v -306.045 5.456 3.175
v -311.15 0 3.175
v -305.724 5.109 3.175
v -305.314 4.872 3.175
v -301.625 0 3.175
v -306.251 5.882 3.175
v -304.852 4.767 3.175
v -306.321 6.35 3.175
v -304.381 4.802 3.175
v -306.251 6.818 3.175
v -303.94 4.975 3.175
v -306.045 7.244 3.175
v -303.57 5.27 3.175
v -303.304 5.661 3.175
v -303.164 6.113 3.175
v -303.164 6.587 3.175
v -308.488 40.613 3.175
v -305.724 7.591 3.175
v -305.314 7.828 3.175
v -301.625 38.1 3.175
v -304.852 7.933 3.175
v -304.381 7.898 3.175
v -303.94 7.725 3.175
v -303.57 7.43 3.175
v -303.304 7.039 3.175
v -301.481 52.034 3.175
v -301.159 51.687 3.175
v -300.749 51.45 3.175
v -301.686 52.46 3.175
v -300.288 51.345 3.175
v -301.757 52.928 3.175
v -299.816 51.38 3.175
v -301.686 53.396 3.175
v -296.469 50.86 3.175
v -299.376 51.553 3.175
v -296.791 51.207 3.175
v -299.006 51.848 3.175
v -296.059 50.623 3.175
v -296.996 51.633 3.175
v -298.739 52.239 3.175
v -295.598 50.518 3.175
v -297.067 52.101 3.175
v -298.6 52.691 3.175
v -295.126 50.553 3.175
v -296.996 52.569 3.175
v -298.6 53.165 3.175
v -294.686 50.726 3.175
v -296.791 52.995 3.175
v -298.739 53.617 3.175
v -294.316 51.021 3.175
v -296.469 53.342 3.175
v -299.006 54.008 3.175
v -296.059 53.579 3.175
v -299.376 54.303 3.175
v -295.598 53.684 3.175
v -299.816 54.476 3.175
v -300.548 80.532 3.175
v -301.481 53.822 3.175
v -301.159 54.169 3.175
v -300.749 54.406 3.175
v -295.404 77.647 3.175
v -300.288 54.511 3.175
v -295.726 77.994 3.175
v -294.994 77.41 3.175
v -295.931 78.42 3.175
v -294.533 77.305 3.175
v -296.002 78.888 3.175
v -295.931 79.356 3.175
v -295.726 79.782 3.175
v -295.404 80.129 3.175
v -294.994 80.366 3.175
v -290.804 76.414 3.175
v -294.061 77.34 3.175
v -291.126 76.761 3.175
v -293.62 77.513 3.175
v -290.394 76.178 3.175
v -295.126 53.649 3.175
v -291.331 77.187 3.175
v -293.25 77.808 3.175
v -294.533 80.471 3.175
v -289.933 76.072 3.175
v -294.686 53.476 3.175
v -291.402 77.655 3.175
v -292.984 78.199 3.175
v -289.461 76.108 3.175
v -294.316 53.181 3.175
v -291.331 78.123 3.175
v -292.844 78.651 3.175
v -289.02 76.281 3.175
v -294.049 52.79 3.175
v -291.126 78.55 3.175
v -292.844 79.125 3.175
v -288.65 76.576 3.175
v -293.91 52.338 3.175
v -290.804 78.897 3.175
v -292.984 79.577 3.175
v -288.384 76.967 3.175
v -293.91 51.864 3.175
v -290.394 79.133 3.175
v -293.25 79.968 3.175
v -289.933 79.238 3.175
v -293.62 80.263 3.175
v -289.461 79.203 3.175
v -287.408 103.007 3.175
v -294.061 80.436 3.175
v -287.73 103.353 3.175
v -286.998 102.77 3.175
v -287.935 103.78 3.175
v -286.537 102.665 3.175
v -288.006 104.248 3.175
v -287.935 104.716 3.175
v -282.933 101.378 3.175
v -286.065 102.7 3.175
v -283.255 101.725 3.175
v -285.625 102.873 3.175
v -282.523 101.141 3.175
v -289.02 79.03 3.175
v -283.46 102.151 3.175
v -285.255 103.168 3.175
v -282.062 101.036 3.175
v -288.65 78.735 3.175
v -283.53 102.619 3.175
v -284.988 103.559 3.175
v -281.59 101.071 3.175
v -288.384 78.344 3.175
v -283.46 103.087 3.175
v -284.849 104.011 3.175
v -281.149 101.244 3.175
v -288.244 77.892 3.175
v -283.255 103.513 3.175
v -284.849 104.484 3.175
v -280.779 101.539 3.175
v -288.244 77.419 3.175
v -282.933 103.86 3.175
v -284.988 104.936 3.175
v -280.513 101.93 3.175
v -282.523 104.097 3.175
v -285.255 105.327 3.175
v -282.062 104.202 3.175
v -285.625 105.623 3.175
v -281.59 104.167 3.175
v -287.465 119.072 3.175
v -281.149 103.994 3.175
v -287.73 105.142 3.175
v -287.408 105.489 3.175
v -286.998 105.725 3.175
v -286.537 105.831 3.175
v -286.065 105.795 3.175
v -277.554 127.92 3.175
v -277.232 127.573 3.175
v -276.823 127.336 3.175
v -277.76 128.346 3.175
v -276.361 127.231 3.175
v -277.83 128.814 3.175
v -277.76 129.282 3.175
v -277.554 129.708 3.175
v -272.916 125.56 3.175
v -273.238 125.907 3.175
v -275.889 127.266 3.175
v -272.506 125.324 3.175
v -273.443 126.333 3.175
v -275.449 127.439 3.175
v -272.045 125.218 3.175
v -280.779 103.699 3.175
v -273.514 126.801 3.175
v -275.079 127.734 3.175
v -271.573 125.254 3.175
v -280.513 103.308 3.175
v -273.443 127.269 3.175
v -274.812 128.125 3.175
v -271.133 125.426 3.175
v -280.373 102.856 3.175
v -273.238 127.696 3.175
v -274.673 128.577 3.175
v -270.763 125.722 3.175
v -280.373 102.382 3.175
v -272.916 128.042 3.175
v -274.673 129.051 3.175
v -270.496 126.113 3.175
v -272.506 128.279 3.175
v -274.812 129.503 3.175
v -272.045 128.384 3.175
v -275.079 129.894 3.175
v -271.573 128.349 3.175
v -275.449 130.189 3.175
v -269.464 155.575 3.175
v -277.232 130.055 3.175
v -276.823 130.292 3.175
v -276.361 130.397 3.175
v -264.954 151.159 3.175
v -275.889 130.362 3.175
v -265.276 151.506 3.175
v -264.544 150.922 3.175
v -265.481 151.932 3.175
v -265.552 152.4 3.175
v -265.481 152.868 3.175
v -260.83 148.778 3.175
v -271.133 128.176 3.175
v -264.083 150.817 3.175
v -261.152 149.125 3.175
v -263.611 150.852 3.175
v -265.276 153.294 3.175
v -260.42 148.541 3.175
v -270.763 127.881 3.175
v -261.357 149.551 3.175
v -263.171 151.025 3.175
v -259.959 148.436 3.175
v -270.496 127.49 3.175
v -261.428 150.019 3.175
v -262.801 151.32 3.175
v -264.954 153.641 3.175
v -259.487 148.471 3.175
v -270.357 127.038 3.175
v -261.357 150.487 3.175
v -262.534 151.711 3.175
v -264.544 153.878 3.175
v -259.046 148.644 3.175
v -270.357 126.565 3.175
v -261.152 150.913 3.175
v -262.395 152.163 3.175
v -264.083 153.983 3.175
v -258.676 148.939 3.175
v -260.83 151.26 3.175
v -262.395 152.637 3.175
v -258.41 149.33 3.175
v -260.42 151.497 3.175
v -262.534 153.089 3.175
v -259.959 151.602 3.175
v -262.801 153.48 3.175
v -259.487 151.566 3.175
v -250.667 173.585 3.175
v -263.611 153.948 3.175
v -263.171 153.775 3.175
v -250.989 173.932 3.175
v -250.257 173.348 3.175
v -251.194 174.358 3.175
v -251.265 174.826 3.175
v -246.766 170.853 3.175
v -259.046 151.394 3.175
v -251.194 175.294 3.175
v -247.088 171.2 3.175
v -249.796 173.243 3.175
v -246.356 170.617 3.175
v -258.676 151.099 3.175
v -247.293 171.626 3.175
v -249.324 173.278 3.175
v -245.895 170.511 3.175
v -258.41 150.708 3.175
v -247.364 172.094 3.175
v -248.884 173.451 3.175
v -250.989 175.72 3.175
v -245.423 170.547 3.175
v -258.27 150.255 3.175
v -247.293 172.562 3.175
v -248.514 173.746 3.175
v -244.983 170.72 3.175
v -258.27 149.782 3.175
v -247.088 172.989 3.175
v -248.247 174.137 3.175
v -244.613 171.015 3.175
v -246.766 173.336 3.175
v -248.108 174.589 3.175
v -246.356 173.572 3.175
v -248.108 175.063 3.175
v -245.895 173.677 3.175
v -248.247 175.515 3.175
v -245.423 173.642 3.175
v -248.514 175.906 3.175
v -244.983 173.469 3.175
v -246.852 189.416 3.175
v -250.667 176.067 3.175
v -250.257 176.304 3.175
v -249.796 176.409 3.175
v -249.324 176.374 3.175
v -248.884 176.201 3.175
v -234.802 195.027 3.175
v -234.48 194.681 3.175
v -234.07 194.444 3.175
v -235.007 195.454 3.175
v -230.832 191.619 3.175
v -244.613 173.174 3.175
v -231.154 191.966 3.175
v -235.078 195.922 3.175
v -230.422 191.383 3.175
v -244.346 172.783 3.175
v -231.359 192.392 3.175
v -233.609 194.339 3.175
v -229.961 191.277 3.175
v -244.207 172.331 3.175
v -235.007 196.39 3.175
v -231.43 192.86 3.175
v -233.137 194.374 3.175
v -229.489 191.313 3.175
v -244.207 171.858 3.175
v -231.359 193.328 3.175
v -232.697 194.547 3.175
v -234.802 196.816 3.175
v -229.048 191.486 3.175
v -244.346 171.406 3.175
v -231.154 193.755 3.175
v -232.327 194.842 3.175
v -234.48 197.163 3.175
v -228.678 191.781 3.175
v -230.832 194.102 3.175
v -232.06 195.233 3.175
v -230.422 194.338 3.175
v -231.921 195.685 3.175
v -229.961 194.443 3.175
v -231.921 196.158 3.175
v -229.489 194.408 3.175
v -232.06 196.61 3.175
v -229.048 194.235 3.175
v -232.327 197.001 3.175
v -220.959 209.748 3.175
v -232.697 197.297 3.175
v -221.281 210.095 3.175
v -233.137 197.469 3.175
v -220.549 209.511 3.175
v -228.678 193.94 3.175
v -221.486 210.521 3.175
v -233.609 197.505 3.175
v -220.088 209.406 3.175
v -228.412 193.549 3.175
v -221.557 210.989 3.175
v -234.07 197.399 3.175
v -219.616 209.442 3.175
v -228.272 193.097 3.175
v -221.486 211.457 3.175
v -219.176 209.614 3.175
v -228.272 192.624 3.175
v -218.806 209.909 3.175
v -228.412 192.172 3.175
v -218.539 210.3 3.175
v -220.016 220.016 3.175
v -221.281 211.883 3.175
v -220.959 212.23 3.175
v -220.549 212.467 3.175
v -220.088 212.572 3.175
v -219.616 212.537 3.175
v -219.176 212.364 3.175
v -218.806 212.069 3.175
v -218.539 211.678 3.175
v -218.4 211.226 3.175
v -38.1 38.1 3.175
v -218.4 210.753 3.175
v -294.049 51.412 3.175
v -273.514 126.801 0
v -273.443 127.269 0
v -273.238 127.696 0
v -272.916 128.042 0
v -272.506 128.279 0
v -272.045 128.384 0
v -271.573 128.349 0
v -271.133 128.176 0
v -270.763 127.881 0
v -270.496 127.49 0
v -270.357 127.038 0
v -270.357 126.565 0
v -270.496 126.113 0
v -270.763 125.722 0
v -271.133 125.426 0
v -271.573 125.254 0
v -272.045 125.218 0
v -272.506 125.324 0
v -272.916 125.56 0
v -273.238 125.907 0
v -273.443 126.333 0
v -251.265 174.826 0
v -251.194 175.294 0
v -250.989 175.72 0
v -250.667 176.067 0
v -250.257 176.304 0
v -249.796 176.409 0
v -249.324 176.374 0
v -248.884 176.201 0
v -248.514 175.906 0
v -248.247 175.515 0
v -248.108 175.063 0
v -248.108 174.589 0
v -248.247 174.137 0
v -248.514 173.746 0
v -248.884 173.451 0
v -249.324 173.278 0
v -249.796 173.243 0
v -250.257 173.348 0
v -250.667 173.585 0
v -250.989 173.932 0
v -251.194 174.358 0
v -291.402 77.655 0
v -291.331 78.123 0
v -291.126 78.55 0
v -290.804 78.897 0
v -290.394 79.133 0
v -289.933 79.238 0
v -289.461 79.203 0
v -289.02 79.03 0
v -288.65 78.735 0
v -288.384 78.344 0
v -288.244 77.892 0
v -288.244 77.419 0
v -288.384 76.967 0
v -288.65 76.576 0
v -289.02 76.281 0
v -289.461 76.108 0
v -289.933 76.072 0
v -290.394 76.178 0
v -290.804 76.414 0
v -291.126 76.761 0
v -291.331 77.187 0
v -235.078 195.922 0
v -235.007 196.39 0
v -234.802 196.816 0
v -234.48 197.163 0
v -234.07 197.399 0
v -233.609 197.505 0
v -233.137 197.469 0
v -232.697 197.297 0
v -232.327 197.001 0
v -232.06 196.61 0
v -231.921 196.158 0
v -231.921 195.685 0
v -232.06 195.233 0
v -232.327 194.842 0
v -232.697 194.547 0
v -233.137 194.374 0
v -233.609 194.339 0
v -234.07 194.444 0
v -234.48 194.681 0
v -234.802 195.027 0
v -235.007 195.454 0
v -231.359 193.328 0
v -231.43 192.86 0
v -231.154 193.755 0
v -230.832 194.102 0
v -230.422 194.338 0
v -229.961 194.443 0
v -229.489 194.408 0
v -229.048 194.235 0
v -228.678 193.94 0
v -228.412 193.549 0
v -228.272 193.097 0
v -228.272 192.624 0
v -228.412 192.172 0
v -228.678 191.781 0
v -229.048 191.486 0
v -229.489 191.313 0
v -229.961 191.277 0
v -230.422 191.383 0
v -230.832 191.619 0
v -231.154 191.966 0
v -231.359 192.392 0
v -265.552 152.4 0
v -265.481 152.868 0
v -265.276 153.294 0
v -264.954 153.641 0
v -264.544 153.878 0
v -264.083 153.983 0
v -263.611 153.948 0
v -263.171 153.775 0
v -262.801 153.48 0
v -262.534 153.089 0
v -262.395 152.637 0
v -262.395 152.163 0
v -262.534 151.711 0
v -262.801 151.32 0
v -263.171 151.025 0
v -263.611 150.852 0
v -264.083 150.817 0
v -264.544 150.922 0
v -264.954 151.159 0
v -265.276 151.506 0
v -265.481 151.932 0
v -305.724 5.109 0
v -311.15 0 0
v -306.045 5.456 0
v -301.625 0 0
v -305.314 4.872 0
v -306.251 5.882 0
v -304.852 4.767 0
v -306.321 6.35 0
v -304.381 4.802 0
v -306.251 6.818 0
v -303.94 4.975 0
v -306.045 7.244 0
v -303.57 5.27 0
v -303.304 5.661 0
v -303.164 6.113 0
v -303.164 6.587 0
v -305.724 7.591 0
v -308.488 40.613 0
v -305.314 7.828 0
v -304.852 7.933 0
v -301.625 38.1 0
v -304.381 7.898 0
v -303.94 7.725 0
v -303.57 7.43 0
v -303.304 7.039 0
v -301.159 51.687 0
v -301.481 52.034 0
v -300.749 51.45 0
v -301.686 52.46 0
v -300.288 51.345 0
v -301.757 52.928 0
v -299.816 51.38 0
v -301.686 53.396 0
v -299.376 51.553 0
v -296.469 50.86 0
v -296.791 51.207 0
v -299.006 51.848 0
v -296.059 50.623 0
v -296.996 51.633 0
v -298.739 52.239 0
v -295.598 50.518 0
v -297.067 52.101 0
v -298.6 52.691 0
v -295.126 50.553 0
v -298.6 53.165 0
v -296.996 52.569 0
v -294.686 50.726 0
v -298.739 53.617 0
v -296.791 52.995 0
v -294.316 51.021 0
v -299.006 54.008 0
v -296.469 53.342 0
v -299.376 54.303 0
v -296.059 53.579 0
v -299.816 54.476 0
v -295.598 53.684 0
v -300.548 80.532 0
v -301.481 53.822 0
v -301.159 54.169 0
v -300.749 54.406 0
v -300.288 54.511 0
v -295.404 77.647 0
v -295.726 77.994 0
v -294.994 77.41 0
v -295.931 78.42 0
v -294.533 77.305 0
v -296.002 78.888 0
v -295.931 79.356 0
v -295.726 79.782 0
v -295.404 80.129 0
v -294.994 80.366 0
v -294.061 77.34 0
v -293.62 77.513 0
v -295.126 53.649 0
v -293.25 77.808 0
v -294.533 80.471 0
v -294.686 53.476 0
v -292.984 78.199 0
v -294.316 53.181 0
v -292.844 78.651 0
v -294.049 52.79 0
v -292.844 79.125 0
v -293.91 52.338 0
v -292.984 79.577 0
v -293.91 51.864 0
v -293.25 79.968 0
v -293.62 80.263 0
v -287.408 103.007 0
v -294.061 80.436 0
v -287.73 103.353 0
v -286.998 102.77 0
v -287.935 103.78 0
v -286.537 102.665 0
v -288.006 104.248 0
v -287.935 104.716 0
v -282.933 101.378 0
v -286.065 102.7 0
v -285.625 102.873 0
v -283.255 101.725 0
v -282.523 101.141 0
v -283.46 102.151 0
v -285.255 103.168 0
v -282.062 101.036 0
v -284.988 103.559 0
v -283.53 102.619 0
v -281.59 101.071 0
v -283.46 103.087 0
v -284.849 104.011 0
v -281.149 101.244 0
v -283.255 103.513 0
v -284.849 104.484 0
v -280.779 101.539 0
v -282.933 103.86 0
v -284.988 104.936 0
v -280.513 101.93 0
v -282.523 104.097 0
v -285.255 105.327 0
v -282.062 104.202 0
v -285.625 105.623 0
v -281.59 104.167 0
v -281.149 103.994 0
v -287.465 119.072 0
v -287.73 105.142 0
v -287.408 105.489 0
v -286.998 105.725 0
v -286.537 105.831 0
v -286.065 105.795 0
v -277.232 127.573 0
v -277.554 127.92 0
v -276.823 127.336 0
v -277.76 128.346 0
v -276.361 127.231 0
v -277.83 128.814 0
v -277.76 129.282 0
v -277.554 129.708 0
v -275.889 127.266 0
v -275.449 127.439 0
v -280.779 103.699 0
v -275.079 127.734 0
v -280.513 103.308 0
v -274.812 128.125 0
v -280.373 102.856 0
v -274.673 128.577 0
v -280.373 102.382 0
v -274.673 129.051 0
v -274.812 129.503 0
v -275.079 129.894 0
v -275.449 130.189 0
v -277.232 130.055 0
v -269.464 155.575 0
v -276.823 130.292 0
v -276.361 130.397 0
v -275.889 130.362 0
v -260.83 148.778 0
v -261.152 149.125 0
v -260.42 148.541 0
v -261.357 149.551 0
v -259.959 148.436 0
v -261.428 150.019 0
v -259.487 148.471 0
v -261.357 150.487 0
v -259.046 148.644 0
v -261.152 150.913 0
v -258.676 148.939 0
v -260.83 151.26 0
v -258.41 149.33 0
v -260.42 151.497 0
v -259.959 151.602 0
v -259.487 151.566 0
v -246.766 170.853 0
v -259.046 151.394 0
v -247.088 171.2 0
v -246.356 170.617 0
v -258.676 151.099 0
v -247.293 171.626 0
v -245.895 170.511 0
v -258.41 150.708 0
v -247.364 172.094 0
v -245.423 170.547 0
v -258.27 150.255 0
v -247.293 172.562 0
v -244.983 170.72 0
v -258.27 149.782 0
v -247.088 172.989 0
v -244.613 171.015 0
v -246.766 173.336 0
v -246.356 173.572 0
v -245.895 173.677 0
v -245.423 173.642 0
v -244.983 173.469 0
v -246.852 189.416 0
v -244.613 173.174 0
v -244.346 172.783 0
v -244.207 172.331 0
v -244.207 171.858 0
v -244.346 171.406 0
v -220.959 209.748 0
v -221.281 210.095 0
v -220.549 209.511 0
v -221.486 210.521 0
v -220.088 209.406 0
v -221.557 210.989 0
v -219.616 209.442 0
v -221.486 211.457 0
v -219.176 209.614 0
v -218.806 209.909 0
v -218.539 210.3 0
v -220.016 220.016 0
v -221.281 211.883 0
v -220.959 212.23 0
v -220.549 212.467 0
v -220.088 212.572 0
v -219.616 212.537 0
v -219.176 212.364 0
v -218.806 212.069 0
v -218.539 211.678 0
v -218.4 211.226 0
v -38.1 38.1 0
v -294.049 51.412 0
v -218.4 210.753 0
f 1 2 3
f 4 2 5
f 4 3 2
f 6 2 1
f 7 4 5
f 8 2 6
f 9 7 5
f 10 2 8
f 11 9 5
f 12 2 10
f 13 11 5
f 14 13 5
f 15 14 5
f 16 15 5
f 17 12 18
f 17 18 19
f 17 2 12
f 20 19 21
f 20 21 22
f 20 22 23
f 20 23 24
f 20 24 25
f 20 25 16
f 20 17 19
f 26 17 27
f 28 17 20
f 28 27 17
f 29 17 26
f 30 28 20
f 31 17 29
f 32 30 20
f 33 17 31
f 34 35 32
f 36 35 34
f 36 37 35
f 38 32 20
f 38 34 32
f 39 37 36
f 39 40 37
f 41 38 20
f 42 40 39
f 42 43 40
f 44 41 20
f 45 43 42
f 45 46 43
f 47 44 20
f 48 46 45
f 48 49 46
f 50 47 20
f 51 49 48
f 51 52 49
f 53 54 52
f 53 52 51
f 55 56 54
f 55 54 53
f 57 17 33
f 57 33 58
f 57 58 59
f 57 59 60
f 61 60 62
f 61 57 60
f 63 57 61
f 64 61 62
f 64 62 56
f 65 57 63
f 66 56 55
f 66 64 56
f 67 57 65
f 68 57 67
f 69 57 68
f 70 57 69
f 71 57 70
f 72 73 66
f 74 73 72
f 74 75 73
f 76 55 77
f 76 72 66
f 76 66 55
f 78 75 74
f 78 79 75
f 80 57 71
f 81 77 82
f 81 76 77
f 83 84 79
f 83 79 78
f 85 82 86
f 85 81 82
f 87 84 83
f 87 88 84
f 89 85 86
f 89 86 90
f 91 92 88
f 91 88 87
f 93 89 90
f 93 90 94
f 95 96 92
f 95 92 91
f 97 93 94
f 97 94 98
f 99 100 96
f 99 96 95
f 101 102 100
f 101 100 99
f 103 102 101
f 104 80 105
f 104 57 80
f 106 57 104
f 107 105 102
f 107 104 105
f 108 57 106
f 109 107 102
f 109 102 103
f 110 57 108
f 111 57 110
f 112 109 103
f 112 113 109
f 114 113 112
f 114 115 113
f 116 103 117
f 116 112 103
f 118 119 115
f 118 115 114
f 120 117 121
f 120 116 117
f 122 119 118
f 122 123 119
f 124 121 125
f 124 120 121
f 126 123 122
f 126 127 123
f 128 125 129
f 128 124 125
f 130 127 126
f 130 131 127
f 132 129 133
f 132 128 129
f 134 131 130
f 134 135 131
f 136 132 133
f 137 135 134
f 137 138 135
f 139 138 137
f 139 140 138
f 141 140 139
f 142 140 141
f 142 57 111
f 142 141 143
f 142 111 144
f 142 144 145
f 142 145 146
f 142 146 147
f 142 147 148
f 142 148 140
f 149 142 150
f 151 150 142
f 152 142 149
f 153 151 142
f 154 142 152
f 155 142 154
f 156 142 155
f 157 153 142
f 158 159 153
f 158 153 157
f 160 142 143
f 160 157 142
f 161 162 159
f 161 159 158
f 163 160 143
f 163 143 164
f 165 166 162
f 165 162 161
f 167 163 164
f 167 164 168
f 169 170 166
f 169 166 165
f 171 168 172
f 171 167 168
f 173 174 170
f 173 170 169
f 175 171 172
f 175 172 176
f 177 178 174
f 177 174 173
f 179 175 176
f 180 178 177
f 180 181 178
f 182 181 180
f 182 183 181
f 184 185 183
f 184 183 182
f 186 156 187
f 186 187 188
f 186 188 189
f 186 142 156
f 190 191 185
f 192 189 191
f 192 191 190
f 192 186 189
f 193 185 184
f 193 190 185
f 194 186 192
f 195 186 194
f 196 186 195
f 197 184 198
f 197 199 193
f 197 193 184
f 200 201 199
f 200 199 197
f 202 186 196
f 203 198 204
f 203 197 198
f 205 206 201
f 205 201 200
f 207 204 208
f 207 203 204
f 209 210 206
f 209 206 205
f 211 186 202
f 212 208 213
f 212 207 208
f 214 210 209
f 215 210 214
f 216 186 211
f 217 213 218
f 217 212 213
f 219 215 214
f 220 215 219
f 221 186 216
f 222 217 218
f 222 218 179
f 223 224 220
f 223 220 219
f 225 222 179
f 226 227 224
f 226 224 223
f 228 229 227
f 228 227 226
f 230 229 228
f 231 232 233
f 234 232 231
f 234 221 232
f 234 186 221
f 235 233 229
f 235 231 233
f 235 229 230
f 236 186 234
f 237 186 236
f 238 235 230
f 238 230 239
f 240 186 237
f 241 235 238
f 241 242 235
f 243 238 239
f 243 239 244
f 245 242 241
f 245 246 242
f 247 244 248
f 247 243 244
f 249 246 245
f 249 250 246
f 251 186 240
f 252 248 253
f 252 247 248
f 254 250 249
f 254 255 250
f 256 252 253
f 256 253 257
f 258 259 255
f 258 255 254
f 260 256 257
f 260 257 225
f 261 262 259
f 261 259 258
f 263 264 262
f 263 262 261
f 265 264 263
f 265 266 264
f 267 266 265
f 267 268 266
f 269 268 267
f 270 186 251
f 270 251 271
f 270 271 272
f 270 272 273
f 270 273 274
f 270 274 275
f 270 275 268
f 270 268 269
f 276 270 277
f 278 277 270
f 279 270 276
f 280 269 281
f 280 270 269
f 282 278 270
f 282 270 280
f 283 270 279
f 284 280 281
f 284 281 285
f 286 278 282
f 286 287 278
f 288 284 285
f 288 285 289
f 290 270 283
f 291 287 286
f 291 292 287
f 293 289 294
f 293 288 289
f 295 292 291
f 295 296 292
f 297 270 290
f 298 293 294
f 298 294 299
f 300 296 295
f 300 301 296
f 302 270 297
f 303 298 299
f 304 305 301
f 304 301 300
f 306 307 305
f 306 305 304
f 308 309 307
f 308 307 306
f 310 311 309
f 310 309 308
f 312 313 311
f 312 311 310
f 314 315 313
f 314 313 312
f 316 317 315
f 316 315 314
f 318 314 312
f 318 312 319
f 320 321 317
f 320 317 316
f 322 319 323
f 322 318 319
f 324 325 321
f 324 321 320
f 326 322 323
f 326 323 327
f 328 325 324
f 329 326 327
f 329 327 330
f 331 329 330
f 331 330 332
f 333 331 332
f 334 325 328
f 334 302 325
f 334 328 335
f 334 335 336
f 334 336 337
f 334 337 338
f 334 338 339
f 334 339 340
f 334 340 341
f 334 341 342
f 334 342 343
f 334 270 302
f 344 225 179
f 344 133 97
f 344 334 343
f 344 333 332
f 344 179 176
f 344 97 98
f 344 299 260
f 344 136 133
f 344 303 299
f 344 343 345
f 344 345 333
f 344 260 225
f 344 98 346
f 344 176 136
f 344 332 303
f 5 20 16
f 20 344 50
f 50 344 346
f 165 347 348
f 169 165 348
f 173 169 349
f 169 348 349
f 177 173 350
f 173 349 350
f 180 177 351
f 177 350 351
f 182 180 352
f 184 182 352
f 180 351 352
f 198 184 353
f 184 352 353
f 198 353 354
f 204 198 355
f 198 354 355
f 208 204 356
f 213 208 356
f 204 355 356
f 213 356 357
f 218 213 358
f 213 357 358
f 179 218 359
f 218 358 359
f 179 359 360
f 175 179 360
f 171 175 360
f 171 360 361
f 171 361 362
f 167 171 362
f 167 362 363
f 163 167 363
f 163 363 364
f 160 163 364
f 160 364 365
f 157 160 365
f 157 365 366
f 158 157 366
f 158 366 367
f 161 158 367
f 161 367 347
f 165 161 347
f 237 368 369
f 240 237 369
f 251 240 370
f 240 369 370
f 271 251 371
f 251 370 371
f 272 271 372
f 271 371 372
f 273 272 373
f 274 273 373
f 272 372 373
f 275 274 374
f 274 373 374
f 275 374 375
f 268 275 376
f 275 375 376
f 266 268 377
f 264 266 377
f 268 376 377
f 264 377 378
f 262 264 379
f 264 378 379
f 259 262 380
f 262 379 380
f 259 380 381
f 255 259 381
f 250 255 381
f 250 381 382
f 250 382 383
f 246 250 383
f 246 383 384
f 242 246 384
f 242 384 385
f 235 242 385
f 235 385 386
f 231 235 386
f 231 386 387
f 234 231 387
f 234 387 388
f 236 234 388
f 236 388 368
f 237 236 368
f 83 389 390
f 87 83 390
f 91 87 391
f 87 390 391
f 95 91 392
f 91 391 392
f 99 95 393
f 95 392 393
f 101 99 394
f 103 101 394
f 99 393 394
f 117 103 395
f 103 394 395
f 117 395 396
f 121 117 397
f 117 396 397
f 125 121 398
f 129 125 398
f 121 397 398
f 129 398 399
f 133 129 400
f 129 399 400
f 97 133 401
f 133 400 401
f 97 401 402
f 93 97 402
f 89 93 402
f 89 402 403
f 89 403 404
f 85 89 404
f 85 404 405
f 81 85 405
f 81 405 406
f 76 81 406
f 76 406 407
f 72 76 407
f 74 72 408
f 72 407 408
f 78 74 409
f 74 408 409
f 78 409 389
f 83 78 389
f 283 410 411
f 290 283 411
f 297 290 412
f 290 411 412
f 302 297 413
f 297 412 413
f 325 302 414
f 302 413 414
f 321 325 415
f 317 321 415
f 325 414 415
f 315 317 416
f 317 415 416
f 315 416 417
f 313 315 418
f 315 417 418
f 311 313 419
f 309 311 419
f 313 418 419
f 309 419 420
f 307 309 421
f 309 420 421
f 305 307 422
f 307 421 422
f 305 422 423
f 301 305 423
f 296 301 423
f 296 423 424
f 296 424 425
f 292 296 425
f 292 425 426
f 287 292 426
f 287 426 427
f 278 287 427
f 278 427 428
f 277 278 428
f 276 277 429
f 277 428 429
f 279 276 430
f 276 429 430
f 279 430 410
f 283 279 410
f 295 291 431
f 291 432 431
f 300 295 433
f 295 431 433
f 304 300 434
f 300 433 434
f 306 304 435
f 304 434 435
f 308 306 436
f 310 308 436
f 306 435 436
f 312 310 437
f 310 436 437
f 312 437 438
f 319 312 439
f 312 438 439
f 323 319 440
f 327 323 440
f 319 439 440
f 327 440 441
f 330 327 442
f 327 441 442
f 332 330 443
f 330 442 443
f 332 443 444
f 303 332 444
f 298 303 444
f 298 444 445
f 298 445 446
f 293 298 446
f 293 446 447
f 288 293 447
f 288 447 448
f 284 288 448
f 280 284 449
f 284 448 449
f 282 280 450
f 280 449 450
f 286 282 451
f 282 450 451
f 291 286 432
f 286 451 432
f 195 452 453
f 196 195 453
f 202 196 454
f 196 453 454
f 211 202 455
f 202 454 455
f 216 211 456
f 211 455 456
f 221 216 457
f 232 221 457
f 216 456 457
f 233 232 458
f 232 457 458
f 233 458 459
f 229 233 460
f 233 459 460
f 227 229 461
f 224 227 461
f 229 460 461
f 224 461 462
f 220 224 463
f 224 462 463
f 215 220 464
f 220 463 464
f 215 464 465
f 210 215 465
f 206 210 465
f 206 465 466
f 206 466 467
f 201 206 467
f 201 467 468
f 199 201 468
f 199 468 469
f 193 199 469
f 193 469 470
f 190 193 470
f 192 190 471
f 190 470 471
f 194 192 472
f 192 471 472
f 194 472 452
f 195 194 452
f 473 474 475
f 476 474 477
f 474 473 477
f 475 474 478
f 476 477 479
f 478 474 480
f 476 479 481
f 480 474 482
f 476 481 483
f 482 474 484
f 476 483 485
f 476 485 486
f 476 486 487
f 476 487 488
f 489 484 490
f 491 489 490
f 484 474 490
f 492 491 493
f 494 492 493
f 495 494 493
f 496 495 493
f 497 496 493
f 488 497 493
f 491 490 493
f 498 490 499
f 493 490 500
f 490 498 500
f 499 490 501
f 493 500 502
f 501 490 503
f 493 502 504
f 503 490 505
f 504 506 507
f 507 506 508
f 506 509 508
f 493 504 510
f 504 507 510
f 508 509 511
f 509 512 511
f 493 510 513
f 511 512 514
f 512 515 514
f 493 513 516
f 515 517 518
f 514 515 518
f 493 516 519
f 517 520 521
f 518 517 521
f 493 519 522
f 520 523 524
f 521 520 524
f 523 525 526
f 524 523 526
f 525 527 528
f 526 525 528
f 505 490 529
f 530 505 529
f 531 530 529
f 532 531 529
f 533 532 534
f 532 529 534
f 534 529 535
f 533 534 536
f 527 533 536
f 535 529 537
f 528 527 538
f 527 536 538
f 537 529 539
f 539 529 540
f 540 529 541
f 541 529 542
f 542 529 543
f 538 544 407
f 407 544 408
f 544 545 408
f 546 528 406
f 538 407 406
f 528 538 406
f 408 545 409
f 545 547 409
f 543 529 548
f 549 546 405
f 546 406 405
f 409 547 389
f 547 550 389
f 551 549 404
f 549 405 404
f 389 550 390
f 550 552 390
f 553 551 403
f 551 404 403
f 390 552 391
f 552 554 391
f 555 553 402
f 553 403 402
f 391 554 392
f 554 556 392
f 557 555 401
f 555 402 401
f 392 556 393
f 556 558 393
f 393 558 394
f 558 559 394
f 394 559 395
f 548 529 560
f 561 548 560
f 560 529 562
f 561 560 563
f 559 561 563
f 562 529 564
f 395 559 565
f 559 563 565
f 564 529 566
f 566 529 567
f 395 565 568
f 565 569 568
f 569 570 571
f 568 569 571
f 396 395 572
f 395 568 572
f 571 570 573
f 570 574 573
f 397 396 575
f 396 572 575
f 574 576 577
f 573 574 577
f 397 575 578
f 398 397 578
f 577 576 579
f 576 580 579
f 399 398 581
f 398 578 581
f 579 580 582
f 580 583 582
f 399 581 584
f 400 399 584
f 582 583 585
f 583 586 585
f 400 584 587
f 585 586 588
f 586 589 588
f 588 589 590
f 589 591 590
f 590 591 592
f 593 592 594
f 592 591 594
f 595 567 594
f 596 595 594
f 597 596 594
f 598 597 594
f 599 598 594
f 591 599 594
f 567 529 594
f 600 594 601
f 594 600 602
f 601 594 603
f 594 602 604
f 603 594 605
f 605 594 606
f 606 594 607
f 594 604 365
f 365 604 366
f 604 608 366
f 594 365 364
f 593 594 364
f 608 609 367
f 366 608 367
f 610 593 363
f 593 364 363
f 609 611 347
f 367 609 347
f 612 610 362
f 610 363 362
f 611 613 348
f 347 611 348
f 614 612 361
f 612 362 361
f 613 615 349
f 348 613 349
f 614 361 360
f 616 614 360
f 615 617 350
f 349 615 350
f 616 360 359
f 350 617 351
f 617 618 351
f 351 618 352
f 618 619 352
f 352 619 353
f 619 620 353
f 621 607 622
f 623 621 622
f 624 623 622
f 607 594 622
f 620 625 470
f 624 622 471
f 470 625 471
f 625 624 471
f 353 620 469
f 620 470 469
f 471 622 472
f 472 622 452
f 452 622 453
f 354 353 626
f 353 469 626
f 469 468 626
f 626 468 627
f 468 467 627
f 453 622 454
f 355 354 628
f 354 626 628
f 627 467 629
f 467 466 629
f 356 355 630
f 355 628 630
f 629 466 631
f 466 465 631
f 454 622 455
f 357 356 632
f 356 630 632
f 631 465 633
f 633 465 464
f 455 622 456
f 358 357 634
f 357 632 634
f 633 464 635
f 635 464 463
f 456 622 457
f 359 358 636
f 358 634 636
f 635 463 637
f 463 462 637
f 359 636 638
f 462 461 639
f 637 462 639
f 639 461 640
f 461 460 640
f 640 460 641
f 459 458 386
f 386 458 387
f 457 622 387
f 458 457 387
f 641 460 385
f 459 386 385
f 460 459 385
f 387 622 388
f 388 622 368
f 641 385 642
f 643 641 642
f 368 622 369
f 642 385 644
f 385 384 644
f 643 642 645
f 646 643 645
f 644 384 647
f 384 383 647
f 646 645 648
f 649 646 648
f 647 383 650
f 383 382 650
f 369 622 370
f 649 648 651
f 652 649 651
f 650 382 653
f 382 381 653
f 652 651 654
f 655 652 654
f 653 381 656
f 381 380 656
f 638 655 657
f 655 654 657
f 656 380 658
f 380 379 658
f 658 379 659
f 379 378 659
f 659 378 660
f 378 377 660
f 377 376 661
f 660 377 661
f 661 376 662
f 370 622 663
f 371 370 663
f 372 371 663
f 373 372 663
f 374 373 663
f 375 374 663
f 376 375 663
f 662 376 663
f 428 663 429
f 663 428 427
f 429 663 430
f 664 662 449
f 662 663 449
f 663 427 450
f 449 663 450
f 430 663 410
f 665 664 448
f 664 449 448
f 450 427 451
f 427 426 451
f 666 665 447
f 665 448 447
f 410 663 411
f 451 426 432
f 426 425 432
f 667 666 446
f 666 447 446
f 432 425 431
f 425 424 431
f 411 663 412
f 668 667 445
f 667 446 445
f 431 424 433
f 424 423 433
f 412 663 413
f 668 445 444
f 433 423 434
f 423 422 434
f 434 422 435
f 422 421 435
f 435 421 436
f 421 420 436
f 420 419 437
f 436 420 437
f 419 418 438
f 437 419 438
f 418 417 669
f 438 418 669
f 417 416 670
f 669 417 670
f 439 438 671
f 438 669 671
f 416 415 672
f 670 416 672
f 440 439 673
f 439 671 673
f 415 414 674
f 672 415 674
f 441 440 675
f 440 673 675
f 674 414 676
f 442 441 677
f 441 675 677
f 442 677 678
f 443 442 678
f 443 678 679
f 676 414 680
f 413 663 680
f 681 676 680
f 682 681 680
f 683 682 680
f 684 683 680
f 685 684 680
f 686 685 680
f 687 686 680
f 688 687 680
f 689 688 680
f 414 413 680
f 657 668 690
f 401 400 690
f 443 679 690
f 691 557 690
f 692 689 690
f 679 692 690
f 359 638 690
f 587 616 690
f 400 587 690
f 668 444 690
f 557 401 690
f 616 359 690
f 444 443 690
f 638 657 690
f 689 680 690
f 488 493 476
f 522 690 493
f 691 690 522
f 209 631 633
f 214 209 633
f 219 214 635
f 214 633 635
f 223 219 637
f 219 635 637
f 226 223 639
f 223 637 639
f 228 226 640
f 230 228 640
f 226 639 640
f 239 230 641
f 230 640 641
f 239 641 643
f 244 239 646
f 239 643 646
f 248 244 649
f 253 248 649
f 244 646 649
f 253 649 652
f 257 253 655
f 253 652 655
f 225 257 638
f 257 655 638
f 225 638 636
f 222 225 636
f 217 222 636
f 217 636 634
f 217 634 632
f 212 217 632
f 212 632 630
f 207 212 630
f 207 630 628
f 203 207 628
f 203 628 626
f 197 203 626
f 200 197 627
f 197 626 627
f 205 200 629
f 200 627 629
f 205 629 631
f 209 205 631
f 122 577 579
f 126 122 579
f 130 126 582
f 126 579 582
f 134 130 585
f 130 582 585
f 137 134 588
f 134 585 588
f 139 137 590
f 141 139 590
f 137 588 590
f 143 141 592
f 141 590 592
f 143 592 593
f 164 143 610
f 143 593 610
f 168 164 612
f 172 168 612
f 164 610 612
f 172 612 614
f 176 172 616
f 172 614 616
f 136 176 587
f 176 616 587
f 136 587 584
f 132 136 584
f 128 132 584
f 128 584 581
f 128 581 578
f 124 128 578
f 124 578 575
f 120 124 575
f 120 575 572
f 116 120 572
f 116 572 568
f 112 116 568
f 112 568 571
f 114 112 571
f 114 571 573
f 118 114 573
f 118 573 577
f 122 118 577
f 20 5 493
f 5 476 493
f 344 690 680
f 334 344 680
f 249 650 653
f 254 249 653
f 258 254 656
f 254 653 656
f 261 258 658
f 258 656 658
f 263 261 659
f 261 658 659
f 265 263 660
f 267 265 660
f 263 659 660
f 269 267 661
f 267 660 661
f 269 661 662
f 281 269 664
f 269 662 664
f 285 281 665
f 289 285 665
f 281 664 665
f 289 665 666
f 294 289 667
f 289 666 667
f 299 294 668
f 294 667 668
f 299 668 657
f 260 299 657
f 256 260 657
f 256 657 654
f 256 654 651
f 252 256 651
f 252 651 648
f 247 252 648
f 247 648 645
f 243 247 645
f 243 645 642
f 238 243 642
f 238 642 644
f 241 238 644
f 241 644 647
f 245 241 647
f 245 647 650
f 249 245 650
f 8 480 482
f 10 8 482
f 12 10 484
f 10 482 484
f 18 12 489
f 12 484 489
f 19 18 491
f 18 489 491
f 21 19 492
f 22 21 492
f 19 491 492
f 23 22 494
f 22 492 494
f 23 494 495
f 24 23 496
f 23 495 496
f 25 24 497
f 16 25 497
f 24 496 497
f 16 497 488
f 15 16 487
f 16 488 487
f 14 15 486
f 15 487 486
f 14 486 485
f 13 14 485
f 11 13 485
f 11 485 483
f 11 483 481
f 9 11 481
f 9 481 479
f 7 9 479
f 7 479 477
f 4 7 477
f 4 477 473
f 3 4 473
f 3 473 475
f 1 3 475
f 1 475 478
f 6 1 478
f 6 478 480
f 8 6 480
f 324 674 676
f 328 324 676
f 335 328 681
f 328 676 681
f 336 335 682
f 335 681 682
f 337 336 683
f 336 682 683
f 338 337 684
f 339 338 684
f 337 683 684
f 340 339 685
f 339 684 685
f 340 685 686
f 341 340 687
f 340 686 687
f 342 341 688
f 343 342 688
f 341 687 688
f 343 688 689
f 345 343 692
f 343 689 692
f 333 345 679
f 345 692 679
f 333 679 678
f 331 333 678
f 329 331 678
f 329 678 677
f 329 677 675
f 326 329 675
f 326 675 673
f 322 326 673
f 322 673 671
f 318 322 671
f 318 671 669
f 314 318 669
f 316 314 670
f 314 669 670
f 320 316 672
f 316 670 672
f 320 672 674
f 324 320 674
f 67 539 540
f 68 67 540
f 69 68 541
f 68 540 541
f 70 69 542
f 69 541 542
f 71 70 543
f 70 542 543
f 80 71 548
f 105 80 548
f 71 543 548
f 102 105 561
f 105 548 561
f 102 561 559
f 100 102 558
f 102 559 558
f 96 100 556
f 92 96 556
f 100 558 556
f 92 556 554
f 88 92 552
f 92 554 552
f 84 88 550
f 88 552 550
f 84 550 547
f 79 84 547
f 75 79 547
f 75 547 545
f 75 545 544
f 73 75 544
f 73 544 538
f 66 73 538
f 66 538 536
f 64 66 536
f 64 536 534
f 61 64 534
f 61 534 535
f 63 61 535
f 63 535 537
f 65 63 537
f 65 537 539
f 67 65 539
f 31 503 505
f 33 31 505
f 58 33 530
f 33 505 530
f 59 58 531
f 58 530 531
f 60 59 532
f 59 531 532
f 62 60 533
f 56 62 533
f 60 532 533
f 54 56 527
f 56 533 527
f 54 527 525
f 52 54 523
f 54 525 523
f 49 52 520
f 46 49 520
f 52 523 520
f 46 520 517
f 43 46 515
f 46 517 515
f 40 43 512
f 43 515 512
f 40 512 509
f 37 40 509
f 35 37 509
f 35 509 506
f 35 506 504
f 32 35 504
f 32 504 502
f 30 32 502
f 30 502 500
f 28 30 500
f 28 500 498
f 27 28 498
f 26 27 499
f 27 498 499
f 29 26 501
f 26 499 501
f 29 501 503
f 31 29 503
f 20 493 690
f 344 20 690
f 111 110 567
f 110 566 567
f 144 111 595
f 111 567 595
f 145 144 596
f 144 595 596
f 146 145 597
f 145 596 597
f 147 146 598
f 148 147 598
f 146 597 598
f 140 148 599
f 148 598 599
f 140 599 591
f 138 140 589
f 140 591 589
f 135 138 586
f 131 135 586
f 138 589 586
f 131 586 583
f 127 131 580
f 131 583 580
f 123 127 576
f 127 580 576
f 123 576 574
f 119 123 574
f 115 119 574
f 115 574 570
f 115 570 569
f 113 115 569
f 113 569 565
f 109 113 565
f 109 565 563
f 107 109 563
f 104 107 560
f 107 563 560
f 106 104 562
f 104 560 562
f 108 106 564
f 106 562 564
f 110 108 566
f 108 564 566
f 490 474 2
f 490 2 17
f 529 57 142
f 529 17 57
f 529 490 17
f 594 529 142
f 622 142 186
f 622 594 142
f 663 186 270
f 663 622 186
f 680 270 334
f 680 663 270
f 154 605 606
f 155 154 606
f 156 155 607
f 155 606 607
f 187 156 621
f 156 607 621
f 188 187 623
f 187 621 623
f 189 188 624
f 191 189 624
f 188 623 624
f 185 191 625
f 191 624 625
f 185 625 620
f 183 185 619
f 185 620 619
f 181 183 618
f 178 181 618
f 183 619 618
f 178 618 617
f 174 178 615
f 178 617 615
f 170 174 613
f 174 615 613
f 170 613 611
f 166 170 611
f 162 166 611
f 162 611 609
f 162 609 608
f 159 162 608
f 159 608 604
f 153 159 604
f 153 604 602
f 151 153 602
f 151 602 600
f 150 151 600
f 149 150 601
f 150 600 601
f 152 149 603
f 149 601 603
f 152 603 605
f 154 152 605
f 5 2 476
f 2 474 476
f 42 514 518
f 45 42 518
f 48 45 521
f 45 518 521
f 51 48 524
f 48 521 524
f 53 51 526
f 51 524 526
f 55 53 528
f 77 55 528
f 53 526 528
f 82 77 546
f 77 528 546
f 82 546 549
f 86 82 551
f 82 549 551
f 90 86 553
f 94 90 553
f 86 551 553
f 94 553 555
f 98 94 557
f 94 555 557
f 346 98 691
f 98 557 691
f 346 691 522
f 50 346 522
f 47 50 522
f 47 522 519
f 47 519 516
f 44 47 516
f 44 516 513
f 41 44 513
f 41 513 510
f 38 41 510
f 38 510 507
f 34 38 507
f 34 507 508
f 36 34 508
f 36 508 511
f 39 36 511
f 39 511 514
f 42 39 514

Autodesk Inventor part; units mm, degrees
ref_plane "YZ Plane" through (0, 0, 0) normal (1, 0, 0) x (0, 1, 0)
ref_plane "XZ Plane" through (0, 0, 0) normal (0, 1, 0) x (-1, 0, 0)
ref_plane "XY Plane" through (0, 0, 0) normal (0, 0, 1) x (1, 0, 0)
sketch "Sketch3" plane through (0, 0, 0) normal (0, 0, 1) x (1, 0, 0)
  line L0 (-311.15, 0) -> (0, 0)
  line L1 (0, 0) -> (-220.0163, 220.0163)
  line L2 (-301.625, 0) -> (-301.625, 38.1)
  line L3 (-301.625, 38.1) -> (-38.1, 38.1)
  line L4 (-23.0461, 23.0461) -> (-23.0461, 0)
  circle A0 centre (0, 0) radius 311.15
  point P0 (0, 0)
  point P1 (-306.9751, 50.8)
  dimension "d10" = 38.1
  dimension "d12" = 9.525
extrude "Extrusion3" add sketch "Sketch3" along normal blind 3.175 contours A0 L1 L3 L2 L0
sketch "Sketch4" plane through (0, 0, 0) normal (0, 0, -1) x (-1, 0, 0)
  line L0 (-141.2846, 157.1654) -> (-0.3893, 16.2701) projected
  line L1 (-145.7747, 152.6753) -> (-141.2846, 157.1654) projected
  line L2 (-4.8794, 11.78) -> (-145.7747, 152.6753) projected
  arc A0 (0, 0) -> (-4.8794, 11.78) centre (-16.6594, 0) ccw projected
  line L3 (0, -6.35) -> (0, 0) projected
  line L4 (6.35, -6.35) -> (0, -6.35) projected
  line L5 (6.35, -2.6303) -> (6.35, -6.35) projected
  arc A1 (5.6464, 5.6464) -> (-0.3893, 16.2701) centre (-16.6594, 0) ccw projected
  line L6 (6.35, -2.6303) -> (214.3556, 205.3753) projected
  line L7 (209.9135, 209.9135) -> (5.6464, 5.6464) projected
  arc A2 (214.3556, 205.3753) -> (209.9135, 209.9135) centre (0, 0) ccw projected
  circle A3 centre (245.7763, 172.0944) radius 1.5875 projected
  circle A4 centre (271.9263, 126.8013) radius 1.5875 projected
  circle A5 centre (289.814, 77.6554) radius 1.5875 projected
  circle A6 centre (298.8958, 26.15) radius 1.5875 projected
  circle A7 centre (304.7338, 6.35) radius 1.5875 projected
  circle A8 centre (249.6775, 174.8261) radius 1.5875 projected
  circle A9 centre (276.2426, 128.814) radius 1.5875 projected
  circle A10 centre (294.4142, 78.888) radius 1.5875 projected
  circle A11 centre (303.6401, 26.5651) radius 1.5875 projected
  circle A12 centre (300.1694, 52.928) radius 1.5875 projected
  circle A13 centre (286.4183, 104.2477) radius 1.5875 projected
  circle A14 centre (263.9645, 152.4) radius 1.5875 projected
  circle A15 centre (233.4903, 195.9217) radius 1.5875 projected
  circle A16 centre (219.9695, 210.9892) radius 1.5875 projected
  circle A17 centre (295.4793, 52.101) radius 1.5875 projected
  circle A18 centre (281.943, 102.6189) radius 1.5875 projected
  circle A19 centre (259.8401, 150.0188) radius 1.5875 projected
  circle A20 centre (229.8421, 192.8604) radius 1.5875 projected
  arc A21 (311.15, 0) -> (220.0163, 220.0163) centre (0, 0) ccw projected
  line L8 (220.0163, 220.0163) -> (0, 0) projected
  line L9 (0, 0) -> (311.15, 0) projected
  point P0 (-16.6594, 0)
  point P1 (-16.6594, 0)
  point P2 (0, 0)
extrude "Extrusion5" cut sketch "Sketch4" against normal through all contours A3 | A4 | A5 | A7 | A8 | A9 | A10 | A12 | A13 | A14 | A15 | A16 | A17 | A18 | A19 | A20
properties part number "Side Panel 2" material "Polycarbonate, Clear"
